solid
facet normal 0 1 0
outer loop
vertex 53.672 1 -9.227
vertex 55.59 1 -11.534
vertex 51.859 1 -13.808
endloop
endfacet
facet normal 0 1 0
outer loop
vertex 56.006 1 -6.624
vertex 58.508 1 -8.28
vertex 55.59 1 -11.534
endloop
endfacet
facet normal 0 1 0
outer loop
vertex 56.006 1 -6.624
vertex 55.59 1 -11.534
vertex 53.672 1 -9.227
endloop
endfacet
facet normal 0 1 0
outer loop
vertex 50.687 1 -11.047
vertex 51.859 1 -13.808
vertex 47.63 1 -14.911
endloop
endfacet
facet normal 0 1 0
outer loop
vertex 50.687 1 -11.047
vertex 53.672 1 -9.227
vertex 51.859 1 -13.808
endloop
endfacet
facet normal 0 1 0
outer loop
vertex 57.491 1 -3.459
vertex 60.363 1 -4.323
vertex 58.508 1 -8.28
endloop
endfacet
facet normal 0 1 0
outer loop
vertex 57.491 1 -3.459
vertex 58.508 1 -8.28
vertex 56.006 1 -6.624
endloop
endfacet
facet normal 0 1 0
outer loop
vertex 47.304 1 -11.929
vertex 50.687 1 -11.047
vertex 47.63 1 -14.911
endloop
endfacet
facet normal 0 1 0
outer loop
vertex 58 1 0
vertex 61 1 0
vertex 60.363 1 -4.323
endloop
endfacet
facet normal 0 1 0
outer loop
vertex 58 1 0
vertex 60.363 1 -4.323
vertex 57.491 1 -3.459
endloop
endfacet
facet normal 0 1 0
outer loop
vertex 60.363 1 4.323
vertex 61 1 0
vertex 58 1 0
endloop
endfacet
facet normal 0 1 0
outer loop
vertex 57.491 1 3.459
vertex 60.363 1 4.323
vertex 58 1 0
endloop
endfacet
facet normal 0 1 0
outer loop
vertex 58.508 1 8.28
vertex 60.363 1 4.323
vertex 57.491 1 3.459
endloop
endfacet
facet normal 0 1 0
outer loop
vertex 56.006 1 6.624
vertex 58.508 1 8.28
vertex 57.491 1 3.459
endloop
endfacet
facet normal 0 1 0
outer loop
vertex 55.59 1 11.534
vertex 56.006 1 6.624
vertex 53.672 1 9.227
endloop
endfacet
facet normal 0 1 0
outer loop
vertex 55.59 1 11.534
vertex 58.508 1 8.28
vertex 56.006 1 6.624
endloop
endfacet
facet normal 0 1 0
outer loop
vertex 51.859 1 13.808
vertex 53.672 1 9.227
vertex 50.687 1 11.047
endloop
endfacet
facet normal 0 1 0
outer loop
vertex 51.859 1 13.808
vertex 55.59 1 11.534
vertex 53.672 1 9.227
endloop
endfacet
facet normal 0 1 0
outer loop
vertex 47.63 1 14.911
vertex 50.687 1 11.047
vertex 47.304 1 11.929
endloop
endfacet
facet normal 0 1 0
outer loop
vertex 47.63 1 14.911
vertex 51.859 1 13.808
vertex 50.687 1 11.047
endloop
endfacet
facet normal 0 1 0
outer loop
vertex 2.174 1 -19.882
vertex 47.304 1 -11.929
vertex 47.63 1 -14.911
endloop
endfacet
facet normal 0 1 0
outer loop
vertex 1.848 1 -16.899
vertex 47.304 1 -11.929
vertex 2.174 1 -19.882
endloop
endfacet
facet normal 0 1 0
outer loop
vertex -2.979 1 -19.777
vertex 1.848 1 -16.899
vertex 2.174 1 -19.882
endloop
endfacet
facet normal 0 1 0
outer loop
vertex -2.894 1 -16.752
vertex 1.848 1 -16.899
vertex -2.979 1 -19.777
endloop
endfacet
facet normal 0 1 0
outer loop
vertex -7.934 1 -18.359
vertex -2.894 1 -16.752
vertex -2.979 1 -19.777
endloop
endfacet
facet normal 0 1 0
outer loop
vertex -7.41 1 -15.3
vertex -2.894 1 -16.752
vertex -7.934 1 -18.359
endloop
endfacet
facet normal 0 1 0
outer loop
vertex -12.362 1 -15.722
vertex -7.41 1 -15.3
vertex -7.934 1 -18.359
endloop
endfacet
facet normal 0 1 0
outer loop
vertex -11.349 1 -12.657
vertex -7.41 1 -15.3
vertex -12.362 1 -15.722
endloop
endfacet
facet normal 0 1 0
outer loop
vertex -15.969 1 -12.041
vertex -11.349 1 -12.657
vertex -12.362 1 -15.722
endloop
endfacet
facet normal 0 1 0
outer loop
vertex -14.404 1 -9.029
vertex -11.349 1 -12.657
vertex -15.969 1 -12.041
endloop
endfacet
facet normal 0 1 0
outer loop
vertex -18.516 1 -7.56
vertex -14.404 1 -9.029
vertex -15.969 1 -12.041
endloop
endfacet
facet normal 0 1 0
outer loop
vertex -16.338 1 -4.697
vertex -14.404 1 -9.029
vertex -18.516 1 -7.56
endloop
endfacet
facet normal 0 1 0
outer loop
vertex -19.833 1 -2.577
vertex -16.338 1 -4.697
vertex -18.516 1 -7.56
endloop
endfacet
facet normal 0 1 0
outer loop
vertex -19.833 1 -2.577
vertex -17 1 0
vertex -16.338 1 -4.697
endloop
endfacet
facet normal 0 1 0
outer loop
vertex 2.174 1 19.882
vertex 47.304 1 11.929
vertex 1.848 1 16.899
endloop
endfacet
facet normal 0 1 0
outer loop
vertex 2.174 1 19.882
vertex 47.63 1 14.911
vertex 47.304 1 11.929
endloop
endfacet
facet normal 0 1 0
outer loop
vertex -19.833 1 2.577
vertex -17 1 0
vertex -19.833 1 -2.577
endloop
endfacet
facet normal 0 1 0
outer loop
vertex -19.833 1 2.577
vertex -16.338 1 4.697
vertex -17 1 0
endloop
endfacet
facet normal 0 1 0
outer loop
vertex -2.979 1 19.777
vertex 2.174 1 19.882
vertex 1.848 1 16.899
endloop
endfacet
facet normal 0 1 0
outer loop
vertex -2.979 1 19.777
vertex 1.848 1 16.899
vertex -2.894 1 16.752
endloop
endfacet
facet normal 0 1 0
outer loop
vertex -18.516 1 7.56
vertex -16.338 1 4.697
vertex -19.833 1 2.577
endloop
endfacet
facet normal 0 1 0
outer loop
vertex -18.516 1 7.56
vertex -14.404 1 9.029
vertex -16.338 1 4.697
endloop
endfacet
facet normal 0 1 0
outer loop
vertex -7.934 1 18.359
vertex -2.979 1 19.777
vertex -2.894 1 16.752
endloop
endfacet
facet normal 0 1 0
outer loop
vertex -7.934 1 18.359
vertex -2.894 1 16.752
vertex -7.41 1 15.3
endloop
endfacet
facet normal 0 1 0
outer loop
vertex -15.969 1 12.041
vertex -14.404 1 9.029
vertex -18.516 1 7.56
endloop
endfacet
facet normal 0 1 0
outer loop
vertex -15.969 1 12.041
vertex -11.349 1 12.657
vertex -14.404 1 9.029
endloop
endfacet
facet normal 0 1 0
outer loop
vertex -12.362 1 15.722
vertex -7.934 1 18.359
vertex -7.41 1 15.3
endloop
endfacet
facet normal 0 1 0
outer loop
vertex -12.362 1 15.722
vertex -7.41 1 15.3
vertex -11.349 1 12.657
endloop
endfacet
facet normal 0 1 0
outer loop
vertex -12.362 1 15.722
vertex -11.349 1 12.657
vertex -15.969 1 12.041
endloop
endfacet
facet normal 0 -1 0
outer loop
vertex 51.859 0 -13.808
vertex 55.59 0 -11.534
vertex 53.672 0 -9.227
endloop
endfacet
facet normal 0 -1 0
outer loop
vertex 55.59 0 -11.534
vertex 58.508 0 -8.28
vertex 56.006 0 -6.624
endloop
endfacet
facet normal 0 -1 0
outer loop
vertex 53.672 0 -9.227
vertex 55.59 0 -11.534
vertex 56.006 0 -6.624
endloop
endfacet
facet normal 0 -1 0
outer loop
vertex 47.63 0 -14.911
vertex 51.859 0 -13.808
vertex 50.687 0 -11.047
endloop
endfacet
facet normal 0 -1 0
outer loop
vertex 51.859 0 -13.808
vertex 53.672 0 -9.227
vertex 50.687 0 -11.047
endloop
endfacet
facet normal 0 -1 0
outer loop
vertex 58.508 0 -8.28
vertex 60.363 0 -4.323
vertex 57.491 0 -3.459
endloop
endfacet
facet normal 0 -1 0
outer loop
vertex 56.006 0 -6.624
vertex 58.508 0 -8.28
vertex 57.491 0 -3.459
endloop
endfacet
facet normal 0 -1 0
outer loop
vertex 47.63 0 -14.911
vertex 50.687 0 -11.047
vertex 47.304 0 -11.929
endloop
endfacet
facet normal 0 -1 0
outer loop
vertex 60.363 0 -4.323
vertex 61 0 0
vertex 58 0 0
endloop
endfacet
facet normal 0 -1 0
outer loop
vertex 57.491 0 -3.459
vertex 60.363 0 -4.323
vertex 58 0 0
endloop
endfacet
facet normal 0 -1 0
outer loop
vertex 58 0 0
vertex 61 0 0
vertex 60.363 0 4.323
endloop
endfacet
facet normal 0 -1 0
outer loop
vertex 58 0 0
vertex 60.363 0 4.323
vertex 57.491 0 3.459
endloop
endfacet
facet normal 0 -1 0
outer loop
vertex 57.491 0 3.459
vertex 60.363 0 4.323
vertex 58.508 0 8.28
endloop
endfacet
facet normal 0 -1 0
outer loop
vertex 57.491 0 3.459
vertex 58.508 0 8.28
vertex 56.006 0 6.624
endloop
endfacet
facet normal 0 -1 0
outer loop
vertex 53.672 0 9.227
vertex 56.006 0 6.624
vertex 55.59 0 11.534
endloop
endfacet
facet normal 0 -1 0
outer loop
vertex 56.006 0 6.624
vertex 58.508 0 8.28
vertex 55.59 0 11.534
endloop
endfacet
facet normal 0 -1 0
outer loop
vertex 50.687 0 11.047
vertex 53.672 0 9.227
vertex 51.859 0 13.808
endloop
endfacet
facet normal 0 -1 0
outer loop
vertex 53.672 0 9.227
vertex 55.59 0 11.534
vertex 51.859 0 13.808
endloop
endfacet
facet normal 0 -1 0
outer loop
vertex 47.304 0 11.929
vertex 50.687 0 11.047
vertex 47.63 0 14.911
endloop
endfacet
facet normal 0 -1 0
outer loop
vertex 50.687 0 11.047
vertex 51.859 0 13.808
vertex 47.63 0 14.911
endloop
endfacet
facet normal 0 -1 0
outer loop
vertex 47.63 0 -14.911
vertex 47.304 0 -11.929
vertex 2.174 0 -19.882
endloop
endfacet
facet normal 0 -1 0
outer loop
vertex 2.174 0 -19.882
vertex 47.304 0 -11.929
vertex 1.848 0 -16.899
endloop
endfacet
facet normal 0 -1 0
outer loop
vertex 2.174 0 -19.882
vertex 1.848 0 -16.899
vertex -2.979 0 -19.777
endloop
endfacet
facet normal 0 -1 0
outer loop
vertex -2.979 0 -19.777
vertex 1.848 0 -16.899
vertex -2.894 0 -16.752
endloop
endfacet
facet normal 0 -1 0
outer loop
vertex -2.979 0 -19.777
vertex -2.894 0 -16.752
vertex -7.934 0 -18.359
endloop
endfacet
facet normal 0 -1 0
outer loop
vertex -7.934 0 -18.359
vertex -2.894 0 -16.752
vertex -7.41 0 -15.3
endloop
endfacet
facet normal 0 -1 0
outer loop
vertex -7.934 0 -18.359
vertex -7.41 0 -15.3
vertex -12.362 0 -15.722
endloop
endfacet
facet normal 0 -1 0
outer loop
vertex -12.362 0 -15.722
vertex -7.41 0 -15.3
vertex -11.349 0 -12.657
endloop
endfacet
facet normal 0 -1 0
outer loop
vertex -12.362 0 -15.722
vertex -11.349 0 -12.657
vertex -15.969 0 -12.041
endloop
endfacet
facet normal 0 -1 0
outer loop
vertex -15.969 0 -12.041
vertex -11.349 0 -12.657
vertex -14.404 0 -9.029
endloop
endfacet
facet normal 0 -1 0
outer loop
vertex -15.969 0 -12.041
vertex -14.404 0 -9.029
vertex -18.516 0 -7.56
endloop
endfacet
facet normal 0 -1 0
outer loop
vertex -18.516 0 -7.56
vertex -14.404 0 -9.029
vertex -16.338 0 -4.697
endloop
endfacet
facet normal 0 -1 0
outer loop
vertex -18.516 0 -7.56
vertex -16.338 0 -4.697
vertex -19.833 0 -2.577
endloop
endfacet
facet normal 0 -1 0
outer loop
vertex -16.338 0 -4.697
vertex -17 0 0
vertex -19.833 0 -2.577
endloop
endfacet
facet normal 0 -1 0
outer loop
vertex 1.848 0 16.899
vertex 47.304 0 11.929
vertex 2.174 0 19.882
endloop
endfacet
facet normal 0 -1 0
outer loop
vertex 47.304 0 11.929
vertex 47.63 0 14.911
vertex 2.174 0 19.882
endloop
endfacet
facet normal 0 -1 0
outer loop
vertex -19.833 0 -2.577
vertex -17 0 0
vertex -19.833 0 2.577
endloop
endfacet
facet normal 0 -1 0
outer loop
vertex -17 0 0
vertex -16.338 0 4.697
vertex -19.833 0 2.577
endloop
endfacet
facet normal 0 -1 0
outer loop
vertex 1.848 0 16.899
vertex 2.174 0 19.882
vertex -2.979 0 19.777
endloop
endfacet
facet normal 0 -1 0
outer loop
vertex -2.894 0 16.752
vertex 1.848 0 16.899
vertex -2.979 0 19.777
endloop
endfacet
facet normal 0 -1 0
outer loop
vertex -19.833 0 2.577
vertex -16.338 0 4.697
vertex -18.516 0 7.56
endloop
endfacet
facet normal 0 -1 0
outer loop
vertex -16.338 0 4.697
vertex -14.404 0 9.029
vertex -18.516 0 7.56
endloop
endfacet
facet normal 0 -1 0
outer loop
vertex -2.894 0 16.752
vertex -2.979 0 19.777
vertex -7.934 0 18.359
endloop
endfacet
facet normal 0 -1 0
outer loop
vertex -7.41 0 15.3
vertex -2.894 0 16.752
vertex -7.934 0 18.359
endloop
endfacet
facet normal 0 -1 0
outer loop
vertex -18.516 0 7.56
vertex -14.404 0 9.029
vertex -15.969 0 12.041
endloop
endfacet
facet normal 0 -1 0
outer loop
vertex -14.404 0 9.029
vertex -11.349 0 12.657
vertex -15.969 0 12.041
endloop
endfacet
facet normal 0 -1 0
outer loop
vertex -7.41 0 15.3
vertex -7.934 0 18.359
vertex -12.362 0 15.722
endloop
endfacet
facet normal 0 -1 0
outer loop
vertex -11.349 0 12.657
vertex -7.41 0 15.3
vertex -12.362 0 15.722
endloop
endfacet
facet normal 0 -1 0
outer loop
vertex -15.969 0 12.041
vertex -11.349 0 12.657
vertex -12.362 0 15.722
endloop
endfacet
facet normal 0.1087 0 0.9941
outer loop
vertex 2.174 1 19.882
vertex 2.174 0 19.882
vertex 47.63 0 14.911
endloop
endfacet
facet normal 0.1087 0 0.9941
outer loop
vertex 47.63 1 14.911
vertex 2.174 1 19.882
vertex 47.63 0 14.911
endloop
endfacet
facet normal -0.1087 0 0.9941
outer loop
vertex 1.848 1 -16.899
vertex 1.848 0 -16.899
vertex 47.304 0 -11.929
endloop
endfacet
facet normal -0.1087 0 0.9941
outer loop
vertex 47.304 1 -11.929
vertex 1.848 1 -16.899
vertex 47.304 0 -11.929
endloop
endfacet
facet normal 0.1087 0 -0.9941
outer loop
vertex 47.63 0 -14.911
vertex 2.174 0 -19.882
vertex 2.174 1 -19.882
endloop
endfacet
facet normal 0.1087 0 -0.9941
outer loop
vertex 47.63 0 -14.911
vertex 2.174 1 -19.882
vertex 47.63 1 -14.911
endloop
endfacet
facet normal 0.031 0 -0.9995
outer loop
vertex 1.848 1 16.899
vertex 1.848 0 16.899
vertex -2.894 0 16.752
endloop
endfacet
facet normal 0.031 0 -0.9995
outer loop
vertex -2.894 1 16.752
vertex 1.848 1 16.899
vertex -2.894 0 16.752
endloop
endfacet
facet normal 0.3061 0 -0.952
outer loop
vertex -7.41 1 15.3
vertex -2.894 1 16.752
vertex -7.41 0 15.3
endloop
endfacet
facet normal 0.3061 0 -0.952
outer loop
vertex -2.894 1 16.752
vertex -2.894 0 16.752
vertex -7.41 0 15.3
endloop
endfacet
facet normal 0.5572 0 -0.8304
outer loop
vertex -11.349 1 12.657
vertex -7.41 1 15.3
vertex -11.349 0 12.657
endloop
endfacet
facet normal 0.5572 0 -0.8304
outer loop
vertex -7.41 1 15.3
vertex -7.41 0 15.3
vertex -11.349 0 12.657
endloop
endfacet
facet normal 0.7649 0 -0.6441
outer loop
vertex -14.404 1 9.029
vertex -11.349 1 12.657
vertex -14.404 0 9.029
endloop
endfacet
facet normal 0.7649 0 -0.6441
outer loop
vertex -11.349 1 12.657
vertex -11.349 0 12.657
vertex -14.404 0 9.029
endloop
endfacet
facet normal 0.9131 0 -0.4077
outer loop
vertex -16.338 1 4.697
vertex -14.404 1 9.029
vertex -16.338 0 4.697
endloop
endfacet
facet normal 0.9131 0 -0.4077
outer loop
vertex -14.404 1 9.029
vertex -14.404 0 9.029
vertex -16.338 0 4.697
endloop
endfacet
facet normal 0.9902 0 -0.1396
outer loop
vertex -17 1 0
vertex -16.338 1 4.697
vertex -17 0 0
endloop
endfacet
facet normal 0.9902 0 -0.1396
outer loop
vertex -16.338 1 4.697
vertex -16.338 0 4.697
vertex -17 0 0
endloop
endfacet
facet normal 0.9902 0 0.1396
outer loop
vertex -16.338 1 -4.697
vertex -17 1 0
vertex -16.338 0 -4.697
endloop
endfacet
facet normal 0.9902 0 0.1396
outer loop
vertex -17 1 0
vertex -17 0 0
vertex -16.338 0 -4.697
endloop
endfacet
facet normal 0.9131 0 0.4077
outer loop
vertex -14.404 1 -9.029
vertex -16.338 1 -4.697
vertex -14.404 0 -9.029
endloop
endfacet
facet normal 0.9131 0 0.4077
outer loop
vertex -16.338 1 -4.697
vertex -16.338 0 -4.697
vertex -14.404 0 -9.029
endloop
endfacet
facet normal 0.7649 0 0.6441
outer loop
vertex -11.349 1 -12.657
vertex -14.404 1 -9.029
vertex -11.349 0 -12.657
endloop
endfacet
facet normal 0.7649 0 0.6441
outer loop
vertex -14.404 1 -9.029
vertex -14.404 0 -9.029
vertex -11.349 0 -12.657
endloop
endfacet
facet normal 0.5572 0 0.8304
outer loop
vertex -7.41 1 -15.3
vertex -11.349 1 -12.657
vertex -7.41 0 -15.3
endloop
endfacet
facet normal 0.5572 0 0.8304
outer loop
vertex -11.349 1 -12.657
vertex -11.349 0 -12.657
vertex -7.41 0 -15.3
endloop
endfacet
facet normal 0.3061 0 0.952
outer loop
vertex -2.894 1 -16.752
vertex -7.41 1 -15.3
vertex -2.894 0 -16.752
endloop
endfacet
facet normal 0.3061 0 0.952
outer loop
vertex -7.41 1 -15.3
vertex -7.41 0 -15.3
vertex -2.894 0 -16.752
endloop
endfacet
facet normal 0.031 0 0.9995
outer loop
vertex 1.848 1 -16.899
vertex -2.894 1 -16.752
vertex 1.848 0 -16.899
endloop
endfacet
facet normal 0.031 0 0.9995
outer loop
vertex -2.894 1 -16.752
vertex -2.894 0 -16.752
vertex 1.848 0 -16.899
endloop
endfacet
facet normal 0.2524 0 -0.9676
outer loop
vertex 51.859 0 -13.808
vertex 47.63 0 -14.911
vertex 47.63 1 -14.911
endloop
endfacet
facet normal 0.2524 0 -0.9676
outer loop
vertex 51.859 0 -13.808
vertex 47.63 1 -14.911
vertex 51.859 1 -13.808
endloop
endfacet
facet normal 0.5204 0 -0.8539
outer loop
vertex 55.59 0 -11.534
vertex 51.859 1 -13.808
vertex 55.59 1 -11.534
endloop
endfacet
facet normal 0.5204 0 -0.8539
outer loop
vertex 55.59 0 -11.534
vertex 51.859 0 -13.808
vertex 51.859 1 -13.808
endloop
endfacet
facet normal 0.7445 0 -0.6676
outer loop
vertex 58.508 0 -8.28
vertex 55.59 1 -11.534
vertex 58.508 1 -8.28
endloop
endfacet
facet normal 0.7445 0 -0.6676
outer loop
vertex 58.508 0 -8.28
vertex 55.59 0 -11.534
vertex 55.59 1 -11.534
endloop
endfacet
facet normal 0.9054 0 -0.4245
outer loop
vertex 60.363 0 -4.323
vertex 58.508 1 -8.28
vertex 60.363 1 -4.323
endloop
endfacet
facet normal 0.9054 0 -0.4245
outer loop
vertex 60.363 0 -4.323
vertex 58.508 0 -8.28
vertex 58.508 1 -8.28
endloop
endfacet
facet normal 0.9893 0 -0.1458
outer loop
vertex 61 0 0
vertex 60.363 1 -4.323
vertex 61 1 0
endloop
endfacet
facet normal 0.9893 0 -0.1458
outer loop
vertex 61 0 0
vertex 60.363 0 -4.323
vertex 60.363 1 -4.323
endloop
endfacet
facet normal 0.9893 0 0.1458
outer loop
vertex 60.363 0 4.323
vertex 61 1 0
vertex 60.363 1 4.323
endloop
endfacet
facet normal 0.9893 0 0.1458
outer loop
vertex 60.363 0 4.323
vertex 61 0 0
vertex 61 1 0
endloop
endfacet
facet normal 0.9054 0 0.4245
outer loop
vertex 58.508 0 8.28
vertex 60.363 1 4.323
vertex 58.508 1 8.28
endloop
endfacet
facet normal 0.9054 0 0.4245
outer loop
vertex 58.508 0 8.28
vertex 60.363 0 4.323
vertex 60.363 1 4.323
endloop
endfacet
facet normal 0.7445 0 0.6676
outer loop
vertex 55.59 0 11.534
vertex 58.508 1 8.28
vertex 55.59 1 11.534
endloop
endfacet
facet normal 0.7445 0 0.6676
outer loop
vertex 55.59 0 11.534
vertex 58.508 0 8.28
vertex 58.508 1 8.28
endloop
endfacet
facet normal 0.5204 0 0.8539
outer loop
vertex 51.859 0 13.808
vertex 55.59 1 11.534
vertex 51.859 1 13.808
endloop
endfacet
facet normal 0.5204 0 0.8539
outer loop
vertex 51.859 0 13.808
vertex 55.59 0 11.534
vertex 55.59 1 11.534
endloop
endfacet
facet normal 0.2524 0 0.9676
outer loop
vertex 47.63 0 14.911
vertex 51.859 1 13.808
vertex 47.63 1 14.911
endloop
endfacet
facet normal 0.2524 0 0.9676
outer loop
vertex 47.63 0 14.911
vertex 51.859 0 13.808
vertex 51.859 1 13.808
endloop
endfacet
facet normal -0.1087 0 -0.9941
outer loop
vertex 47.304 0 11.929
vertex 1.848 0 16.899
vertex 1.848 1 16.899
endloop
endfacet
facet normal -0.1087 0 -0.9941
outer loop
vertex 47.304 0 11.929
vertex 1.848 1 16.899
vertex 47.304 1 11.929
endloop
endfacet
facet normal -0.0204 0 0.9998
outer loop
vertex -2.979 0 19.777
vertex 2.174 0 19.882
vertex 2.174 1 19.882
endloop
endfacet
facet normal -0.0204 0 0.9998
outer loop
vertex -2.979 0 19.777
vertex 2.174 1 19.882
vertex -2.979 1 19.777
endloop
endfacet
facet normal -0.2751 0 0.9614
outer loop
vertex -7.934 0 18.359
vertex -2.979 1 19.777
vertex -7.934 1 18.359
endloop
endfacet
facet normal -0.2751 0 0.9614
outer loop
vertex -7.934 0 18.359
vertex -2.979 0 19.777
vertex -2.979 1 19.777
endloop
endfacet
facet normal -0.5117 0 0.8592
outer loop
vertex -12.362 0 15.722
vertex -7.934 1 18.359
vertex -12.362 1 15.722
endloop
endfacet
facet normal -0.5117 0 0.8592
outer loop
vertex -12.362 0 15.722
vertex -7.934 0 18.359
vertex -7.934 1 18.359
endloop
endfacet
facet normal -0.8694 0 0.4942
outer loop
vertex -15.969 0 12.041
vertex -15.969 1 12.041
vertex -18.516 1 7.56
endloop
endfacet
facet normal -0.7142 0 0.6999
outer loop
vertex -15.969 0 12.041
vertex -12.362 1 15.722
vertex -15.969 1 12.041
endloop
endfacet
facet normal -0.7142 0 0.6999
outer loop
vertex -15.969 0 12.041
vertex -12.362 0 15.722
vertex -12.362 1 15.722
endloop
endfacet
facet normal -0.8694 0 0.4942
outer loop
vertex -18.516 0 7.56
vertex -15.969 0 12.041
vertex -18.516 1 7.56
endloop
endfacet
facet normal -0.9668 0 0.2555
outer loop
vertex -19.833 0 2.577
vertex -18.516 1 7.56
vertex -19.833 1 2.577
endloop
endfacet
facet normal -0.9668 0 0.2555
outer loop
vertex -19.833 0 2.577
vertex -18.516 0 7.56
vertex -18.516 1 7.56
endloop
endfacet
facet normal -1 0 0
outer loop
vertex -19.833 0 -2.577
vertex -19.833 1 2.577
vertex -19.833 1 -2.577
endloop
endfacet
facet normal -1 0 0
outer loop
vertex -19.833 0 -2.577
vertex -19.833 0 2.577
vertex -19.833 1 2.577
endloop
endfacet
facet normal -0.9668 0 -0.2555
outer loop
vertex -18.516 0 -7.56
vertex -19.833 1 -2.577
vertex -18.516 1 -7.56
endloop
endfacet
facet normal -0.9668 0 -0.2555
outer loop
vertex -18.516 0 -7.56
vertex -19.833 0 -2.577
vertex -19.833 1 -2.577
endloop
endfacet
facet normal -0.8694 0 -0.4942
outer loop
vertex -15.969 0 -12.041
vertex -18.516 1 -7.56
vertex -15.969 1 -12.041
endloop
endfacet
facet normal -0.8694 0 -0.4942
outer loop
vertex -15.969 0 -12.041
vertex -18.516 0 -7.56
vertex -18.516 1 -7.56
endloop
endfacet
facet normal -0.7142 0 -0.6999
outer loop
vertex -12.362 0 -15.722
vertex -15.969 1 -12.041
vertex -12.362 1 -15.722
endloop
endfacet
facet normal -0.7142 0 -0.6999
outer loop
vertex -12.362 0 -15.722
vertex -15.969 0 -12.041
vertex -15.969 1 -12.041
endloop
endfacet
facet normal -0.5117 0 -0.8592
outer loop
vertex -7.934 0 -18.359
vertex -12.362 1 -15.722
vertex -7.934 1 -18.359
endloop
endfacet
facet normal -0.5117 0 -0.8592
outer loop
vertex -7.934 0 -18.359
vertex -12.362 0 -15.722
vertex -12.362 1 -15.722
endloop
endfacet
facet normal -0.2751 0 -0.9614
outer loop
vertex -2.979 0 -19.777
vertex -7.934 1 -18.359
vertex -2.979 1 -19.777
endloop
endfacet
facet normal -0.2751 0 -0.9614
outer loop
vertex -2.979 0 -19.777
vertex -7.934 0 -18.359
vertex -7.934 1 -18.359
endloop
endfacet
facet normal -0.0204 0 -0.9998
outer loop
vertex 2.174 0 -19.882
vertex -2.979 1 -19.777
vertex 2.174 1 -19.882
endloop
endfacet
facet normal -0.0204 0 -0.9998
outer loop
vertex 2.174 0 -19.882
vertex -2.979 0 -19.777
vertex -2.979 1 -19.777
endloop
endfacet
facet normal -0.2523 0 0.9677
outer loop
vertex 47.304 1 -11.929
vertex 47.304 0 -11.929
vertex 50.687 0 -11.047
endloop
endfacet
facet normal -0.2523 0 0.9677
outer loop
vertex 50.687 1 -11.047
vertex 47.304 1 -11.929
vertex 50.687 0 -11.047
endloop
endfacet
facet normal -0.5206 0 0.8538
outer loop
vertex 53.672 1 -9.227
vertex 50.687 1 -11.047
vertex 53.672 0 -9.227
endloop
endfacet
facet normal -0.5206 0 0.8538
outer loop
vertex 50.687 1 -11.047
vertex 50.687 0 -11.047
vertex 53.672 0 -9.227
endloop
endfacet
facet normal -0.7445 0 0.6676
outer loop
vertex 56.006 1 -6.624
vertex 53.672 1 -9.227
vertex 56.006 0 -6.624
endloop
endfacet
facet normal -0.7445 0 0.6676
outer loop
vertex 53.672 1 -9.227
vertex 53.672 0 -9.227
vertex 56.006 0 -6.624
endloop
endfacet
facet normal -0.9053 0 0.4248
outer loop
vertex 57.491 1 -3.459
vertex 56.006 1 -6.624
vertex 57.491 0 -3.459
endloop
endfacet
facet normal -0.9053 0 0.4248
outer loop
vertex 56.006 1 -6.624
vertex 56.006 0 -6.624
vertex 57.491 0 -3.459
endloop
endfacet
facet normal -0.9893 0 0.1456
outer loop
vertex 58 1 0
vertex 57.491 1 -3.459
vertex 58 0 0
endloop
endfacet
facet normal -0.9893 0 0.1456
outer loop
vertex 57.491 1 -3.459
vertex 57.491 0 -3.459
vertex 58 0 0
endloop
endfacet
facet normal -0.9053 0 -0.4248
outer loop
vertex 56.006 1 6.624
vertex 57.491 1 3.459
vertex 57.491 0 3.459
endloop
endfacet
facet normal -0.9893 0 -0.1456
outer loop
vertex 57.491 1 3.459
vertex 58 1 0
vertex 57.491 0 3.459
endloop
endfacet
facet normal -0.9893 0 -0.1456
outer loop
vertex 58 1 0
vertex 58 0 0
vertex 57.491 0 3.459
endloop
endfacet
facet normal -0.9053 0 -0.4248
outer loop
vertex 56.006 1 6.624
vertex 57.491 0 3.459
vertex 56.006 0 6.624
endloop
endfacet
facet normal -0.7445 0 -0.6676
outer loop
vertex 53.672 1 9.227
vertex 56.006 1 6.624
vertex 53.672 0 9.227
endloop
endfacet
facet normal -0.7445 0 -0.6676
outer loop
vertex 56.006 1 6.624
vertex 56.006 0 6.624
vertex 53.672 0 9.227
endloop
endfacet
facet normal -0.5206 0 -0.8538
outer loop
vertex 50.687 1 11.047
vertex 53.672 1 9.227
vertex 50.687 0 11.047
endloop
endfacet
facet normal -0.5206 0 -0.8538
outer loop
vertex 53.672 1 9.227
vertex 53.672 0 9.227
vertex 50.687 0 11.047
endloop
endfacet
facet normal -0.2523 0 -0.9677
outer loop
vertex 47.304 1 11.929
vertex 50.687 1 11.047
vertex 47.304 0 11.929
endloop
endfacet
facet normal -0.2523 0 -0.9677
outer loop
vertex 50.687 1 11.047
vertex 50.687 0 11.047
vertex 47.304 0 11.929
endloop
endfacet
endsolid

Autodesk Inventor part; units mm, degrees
ref_plane "YZ Plane" through (0, 0, 0) normal (1, 0, 0) x (0, 1, 0)
ref_plane "XZ Plane" through (0, 0, 0) normal (0, 1, 0) x (-1, 0, 0)
ref_plane "XY Plane" through (0, 0, 0) normal (0, 0, 1) x (1, 0, 0)
sketch "Skizze1" plane through (0, 0, 0) normal (0, 1, 0) x (-1, 0, 0)
  arc A0 (-2.1739, -19.8815) -> (-2.1739, 19.8815) centre (0, 0) ccw
  arc A1 (-47.6304, 14.9111) -> (-47.6304, -14.9111) centre (-46, 0) ccw
  line L0 (-2.1739, 19.8815) -> (-47.6304, 14.9111)
  line L1 (-2.1739, -19.8815) -> (-47.6304, -14.9111)
  line L2 (45.0235, 0) -> (-115.148, 0) construction
  arc A2 (-1.8478, -16.8993) -> (-1.8478, 16.8993) centre (0, 0) ccw
  arc A3 (-47.3043, 11.9289) -> (-47.3043, -11.9289) centre (-46, 0) ccw
  line L3 (-1.8478, 16.8993) -> (-47.3043, 11.9289)
  line L4 (-1.8478, -16.8993) -> (-47.3043, -11.9289)
  dimension "d0" = 40
  dimension "d1" = 30
  dimension "d2" = 46
  dimension "d3" = 3
  dimension "d4" = 3
extrude "Extrusion1" add sketch "Skizze1" along normal blind 1
properties part number "Dichtungsgummi"
